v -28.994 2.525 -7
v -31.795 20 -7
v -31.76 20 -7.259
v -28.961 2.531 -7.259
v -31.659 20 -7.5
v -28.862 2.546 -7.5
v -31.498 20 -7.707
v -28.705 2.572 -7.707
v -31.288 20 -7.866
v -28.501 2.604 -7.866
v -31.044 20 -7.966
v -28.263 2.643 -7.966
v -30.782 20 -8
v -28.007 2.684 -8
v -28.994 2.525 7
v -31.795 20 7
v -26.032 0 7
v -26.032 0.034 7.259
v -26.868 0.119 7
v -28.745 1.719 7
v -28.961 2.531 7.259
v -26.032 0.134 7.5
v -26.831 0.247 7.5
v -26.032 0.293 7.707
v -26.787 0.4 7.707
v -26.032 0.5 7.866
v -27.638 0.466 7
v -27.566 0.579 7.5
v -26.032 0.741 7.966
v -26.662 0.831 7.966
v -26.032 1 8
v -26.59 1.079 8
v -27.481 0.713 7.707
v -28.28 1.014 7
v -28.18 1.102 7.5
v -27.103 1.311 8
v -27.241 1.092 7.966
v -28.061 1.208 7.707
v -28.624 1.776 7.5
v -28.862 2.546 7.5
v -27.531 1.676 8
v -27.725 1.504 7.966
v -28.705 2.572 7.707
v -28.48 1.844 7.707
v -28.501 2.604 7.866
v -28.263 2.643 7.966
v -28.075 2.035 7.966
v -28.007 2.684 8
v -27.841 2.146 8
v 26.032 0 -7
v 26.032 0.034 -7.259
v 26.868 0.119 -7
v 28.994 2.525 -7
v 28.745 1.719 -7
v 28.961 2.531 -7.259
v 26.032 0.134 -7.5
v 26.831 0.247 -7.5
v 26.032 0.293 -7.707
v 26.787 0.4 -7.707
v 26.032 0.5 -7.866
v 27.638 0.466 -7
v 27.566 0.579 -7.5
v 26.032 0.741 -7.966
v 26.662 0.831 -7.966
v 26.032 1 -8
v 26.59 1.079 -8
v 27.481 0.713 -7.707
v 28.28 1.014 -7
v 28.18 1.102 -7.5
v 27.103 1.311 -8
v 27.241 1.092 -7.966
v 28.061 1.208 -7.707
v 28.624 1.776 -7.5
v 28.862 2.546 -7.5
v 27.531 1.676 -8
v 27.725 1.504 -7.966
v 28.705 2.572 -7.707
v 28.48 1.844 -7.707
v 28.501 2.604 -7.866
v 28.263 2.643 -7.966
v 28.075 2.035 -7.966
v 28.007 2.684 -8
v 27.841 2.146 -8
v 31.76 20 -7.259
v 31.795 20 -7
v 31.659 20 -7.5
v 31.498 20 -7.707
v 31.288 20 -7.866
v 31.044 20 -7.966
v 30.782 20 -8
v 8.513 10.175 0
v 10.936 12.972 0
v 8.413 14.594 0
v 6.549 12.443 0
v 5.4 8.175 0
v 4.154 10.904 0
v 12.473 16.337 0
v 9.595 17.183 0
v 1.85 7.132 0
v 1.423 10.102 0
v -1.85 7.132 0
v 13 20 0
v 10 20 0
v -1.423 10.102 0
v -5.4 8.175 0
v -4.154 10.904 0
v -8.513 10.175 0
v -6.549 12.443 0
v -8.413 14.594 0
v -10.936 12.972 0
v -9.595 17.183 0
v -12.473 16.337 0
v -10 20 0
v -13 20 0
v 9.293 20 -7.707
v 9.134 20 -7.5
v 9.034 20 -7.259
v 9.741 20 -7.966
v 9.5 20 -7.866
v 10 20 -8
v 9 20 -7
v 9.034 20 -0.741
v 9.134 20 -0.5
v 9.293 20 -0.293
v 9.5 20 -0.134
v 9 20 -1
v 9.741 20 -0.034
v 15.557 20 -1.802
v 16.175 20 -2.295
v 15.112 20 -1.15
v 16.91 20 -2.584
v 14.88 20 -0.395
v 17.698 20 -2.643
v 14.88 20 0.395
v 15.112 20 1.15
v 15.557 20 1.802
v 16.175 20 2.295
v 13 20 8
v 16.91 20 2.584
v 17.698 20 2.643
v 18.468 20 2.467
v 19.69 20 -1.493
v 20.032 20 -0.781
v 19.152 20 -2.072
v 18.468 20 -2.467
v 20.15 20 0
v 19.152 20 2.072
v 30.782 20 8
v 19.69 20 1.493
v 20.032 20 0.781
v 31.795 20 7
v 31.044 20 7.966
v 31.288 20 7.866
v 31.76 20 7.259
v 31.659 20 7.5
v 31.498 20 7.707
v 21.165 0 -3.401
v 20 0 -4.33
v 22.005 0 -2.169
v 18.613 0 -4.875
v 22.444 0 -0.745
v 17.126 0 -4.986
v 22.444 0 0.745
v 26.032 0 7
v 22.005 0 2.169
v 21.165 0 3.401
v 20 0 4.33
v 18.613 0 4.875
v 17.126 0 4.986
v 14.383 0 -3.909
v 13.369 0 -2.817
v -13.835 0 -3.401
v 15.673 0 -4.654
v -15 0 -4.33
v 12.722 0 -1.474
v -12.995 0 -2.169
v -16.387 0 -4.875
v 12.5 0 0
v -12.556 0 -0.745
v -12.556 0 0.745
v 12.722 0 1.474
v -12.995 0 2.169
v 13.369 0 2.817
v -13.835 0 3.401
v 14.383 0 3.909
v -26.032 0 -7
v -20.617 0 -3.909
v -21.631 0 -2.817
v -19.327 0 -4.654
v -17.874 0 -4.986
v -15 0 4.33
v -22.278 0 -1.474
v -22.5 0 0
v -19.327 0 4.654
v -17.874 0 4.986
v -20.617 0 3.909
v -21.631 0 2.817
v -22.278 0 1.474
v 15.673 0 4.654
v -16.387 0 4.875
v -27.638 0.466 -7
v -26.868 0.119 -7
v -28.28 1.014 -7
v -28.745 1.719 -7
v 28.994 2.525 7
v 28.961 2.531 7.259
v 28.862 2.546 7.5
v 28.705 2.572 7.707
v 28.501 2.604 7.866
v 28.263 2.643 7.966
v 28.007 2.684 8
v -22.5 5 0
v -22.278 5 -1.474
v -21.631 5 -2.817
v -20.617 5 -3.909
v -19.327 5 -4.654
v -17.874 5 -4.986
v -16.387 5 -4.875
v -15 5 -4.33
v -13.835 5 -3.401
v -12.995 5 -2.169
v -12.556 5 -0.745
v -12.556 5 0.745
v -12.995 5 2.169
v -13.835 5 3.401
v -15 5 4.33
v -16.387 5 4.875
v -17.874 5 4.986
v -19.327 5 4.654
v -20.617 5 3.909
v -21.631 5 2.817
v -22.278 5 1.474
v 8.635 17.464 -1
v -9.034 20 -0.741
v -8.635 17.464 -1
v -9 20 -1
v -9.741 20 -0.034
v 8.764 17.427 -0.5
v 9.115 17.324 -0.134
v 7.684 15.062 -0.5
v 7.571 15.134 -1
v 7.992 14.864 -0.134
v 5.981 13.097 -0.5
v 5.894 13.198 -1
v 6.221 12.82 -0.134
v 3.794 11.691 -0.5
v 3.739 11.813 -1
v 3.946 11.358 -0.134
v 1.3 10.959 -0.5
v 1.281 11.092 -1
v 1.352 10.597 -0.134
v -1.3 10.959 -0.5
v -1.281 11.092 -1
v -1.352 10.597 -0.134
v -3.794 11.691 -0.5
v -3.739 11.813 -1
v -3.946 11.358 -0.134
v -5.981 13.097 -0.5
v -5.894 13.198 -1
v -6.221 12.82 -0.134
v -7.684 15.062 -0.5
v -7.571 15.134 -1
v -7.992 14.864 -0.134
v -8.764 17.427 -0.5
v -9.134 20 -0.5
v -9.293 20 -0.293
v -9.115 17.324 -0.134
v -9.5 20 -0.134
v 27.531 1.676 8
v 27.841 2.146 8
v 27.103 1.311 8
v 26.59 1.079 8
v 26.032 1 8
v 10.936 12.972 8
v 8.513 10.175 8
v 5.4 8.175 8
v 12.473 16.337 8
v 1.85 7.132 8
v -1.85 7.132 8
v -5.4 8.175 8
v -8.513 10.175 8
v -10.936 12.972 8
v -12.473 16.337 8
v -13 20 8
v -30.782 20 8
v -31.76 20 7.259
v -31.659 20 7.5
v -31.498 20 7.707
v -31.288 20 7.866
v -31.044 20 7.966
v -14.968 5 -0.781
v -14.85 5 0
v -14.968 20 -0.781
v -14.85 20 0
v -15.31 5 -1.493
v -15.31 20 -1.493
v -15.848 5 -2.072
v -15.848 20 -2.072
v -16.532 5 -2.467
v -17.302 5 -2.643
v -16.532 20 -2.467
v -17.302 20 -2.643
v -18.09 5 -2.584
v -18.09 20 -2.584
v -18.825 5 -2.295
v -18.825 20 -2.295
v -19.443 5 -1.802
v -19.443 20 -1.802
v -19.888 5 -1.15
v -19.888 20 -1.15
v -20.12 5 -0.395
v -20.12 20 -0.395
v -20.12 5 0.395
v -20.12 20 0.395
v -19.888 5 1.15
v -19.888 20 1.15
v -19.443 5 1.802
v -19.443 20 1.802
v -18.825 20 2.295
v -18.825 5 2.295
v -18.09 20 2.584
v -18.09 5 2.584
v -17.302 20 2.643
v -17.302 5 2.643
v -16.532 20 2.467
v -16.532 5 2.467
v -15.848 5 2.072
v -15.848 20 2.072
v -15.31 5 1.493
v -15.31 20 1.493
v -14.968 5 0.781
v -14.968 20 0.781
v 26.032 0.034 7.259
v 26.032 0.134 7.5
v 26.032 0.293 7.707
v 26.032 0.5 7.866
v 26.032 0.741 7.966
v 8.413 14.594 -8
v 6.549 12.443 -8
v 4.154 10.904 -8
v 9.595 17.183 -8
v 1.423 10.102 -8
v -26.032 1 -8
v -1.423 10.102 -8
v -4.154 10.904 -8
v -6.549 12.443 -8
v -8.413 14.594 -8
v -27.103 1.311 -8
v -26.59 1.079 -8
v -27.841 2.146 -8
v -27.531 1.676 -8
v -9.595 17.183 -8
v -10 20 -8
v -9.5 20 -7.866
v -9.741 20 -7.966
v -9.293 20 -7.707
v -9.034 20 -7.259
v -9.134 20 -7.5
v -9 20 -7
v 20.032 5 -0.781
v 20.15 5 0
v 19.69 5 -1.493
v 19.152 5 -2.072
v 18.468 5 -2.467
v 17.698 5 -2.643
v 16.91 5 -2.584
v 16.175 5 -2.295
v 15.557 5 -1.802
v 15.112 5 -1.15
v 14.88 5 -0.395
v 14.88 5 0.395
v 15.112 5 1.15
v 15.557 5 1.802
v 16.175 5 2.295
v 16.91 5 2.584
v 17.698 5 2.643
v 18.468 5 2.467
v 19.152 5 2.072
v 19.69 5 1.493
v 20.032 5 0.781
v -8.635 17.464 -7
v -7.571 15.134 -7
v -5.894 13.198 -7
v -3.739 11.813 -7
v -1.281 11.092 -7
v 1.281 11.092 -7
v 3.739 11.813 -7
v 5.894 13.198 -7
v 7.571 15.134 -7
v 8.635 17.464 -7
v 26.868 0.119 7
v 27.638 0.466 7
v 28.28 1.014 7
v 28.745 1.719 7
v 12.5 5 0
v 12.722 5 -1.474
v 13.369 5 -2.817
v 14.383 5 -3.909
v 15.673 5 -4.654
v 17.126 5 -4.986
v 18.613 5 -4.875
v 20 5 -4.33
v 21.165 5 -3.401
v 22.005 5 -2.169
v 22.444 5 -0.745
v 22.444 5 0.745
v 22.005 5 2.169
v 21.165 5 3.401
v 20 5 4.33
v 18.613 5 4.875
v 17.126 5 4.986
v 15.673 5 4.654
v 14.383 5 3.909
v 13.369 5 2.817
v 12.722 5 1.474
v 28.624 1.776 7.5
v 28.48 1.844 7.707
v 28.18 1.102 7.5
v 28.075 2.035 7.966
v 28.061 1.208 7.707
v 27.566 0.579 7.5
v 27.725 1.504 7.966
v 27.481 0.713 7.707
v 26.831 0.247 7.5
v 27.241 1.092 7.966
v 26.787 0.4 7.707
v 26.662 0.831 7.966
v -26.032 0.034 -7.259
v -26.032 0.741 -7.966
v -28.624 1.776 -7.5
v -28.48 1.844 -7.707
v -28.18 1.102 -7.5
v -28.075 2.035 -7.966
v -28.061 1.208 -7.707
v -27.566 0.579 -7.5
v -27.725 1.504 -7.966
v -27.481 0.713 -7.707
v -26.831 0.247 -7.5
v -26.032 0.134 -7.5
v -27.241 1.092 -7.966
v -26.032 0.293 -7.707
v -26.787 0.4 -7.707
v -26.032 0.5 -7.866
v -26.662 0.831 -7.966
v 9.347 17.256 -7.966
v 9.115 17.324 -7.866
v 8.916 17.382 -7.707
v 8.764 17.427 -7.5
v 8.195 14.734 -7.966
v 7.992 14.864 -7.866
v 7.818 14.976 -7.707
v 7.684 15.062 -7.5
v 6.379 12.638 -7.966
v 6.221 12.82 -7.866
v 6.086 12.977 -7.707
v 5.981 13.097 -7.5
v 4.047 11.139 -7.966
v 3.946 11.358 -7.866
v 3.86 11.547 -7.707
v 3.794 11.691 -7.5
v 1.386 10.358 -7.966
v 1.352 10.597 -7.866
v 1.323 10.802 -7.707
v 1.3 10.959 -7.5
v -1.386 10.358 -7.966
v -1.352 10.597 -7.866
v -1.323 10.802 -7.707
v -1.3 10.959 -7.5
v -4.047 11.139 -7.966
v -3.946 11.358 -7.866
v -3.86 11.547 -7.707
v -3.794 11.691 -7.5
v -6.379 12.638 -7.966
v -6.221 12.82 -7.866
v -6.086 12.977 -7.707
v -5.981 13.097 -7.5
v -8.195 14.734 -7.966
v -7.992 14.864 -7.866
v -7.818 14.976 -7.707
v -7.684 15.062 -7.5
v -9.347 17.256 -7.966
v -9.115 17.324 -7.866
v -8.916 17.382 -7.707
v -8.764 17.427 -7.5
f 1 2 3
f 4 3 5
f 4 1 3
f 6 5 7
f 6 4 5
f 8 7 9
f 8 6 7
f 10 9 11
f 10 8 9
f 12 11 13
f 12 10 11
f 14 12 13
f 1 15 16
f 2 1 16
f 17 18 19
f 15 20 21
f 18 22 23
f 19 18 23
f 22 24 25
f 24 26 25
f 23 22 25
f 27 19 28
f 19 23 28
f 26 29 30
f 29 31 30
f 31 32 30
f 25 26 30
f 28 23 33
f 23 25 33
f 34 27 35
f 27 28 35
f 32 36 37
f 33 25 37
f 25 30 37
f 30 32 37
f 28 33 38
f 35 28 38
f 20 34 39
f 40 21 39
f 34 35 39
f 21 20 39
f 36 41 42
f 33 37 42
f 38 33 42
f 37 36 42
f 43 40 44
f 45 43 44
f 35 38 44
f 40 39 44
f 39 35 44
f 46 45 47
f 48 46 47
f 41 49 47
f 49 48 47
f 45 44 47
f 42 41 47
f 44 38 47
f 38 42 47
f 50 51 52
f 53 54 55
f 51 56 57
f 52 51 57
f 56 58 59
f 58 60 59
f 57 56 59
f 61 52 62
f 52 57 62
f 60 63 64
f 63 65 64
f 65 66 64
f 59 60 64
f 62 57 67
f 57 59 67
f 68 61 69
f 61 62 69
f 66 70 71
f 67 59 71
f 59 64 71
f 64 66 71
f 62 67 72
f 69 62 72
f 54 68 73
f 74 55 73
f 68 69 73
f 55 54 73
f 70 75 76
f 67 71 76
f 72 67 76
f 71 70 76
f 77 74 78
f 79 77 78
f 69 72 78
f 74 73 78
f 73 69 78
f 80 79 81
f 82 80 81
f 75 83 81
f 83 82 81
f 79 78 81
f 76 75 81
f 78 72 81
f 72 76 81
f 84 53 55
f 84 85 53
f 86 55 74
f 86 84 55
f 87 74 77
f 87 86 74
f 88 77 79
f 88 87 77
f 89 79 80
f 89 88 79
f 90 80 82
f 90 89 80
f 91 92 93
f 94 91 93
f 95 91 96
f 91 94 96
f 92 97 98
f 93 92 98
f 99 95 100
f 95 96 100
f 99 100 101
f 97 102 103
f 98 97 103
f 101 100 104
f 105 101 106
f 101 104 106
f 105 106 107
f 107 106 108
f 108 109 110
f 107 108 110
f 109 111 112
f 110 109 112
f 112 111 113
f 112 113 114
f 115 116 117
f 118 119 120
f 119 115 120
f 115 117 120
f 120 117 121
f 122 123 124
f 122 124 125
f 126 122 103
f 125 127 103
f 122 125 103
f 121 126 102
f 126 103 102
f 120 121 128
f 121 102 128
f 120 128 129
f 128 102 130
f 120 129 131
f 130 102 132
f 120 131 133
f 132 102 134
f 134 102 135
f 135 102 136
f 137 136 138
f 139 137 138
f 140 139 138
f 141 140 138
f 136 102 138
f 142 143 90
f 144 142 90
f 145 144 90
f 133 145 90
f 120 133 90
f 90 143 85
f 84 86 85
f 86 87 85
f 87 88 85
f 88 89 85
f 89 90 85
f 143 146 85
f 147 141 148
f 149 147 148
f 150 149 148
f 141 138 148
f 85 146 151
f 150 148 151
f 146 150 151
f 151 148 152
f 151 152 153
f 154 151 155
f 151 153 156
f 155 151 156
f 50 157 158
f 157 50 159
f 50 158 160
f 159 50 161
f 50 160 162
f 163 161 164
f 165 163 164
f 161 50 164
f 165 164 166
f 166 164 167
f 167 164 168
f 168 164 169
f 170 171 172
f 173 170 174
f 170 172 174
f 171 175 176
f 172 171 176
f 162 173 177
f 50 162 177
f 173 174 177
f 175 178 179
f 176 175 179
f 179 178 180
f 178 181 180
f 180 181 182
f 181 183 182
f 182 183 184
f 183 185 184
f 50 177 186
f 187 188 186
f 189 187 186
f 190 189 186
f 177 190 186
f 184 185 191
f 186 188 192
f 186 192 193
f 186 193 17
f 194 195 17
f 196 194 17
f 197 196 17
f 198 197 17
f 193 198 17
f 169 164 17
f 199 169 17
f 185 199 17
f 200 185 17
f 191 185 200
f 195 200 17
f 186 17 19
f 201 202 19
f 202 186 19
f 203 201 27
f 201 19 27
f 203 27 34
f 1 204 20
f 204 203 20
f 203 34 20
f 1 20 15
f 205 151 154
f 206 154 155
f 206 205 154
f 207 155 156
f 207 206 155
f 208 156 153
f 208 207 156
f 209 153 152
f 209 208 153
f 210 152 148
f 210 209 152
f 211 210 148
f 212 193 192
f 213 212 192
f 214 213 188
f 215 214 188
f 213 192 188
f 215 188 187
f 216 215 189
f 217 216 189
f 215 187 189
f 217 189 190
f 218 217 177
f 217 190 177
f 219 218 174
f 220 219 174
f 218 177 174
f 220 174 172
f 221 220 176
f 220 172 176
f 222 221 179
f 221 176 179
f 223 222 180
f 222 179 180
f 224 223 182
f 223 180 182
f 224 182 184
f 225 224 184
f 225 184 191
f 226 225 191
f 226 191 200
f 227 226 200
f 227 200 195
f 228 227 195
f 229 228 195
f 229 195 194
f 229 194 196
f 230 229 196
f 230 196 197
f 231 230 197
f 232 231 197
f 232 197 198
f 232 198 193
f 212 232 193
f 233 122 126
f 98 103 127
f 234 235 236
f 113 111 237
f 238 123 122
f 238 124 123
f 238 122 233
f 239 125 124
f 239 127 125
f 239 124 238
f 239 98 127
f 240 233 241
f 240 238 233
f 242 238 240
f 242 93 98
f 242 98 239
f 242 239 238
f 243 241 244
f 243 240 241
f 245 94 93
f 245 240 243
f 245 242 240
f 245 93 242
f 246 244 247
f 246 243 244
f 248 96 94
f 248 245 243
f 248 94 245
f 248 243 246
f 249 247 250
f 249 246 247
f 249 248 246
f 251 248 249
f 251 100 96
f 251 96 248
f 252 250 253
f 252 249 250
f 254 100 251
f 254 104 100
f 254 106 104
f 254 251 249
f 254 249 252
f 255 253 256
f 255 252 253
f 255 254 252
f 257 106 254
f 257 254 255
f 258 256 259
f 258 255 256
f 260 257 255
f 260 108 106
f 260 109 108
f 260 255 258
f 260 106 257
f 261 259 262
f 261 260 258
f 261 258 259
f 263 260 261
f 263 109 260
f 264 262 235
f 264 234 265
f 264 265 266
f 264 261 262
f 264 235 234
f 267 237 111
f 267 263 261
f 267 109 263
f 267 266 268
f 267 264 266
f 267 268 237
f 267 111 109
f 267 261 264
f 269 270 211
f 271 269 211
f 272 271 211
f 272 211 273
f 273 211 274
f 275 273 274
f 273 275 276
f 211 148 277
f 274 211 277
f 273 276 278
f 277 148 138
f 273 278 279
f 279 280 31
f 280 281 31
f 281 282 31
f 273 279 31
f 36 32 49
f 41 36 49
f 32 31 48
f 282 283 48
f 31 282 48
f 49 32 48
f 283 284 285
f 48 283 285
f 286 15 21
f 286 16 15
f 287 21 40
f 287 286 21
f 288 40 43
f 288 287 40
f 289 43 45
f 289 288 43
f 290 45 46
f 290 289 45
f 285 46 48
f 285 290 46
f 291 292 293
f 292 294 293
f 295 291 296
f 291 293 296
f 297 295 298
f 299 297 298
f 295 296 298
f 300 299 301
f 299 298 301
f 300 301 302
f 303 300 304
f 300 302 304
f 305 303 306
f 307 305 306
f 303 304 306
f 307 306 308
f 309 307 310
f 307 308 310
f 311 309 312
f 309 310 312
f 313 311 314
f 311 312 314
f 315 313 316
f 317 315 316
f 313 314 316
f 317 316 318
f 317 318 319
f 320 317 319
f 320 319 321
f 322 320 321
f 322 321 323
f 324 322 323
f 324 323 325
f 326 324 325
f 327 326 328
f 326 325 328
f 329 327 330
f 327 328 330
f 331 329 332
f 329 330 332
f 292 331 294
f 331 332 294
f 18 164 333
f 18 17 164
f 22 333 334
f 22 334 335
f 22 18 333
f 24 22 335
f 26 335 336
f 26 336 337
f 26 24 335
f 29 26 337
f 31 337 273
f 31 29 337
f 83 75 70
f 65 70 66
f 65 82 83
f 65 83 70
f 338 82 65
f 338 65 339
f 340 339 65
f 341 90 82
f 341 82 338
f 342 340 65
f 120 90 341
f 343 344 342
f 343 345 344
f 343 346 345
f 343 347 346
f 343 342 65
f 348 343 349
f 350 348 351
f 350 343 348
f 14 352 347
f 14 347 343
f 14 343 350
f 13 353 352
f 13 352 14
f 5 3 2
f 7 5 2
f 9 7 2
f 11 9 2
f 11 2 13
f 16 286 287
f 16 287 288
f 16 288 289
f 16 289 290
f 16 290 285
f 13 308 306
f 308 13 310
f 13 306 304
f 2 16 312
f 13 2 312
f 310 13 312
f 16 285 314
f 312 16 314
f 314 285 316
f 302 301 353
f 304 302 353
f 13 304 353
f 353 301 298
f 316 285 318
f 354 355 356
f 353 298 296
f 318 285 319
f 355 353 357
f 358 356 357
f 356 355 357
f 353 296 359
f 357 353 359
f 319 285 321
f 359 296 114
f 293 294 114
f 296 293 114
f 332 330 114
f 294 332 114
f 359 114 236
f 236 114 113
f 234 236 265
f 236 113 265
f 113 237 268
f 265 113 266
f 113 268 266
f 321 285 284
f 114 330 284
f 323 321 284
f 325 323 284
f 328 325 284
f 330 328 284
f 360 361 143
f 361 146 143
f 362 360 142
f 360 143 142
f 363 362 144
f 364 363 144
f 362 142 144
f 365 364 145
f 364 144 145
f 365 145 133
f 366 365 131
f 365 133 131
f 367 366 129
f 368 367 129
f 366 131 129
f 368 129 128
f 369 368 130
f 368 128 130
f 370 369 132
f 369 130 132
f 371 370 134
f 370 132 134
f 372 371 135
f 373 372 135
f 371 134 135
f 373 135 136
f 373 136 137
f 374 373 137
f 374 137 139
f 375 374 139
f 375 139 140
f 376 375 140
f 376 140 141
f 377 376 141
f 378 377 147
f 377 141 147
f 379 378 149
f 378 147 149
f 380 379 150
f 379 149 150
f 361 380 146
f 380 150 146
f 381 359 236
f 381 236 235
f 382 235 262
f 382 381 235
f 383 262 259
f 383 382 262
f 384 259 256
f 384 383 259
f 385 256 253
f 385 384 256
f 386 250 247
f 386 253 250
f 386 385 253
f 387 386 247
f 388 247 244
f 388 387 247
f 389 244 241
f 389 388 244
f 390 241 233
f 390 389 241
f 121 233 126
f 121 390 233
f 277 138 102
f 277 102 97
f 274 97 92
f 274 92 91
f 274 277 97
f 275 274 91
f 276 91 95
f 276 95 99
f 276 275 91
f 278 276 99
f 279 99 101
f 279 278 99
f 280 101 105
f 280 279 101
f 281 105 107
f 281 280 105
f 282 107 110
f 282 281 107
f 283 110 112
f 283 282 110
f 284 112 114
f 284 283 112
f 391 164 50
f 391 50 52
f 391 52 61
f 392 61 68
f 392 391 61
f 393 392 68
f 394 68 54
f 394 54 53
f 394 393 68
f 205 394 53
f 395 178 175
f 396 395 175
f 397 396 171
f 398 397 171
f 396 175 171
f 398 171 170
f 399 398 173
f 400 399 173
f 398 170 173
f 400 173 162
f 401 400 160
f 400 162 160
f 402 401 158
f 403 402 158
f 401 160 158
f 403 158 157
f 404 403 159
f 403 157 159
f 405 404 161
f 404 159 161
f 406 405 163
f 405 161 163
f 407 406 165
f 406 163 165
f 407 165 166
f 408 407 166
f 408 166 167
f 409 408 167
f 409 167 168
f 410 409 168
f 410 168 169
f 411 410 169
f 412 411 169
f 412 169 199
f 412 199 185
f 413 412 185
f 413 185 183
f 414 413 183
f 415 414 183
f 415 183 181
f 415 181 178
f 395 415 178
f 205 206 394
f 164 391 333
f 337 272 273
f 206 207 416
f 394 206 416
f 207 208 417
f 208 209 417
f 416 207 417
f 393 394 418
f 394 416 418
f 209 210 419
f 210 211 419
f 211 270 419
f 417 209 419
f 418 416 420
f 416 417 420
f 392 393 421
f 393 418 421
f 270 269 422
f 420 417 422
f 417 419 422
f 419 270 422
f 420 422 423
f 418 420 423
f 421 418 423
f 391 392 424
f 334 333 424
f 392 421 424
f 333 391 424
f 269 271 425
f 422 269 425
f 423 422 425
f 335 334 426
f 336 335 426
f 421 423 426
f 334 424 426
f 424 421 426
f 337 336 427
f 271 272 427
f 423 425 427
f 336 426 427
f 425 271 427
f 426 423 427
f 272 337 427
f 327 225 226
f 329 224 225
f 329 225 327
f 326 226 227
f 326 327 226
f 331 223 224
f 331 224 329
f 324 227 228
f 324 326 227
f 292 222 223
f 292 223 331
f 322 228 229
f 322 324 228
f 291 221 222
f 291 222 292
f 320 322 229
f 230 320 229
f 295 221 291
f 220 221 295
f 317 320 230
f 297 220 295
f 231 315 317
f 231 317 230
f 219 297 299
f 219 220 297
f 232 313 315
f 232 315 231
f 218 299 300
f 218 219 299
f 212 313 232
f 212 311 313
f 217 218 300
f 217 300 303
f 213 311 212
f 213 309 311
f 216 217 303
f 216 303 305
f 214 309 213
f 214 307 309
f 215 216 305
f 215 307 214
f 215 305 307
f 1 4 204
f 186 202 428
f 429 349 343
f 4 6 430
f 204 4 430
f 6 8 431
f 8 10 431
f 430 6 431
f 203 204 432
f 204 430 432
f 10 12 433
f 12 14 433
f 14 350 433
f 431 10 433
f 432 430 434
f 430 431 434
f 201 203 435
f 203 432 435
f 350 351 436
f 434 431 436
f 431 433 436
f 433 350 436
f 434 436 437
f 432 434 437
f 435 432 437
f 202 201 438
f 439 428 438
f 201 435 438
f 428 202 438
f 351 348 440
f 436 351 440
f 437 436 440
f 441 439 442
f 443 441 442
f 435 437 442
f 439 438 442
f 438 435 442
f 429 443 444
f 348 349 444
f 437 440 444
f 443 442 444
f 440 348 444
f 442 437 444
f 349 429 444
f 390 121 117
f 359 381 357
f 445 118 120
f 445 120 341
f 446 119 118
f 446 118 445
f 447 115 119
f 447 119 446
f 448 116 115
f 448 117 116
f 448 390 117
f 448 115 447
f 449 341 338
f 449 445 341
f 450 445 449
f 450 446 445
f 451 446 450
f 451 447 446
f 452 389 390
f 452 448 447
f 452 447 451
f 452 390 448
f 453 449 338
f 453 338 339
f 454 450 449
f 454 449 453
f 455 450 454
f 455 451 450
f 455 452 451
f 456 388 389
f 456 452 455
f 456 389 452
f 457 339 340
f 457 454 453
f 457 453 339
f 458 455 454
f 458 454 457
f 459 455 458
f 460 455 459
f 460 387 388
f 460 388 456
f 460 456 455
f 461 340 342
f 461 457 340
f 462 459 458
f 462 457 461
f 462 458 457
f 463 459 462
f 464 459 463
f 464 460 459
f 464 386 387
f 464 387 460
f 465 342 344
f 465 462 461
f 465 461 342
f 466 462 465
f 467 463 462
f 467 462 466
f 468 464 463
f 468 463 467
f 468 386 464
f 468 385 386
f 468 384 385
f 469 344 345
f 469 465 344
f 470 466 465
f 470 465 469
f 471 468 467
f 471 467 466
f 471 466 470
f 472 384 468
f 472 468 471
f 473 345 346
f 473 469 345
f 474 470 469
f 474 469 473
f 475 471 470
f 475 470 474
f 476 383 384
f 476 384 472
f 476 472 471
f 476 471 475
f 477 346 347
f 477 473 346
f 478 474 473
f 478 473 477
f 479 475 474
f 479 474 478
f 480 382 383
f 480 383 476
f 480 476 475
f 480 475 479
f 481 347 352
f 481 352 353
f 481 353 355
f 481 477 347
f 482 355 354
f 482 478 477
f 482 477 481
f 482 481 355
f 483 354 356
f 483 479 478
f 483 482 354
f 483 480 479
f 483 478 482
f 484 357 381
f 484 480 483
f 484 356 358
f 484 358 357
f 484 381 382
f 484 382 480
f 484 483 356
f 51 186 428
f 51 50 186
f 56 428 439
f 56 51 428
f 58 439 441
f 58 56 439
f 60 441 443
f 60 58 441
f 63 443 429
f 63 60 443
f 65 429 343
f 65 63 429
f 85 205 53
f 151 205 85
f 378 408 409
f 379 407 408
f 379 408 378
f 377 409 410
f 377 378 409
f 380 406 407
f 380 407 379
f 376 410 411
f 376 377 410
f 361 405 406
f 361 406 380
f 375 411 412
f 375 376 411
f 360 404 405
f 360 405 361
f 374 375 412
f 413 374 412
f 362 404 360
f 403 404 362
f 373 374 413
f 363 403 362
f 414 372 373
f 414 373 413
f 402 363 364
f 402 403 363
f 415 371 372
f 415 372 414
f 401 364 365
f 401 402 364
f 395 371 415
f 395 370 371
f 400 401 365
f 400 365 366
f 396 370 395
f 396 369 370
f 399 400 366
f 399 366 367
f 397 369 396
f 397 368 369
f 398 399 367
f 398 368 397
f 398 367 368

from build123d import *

# Parameters (mm, degrees)
DODANIE_WYCI_GNI_CIE1_DEPTH                       = 8
WYTNIJ_WYCI_GNI_CIE1_DEPTH                        = 8
WYTNIJ_WYCI_GNI_CIE2_DEPTH                        = 39.404607438
WYTNIJ_WYCI_GNI_CIE2_DEPTH_BACK                   = 39.404607438
POG_BIENIE_WALCOWE_POD_M5_RUB_Z_BEM_W_D           = 5.3
POG_BIENIE_WALCOWE_POD_M5_RUB_Z_BEM_W_CBORE_D     = 10
POG_BIENIE_WALCOWE_POD_M5_RUB_Z_BEM_W_CBORE_DEPTH = 5
ZAOKR_GLENIE1_R                                   = 3
ZAOKR_GLENIE2_R                                   = 1


with BuildPart() as part:
    # Szkic1 → Dodanie-wyciągnięcie1 (new, symmetric)
    with BuildSketch(Plane.XY):
        Polygon((0, 0), (28.58974359, 0), (31.794871795, 20), (0, 20), align=None)
    dodanie_wyci_gni_cie1 = extrude(amount=DODANIE_WYCI_GNI_CIE1_DEPTH, both=True)

    # Lustro1: Dodanie-wyciągnięcie1 across plane
    add(dodanie_wyci_gni_cie1.mirror(Plane(origin=(0, 20, 8), x_dir=(0, 0, 1), z_dir=(1, 0, 0))))

    # Szkic2 → Wytnij-wyciągnięcie1 (cut)
    with BuildSketch(Plane.XY.offset(8)):
        with BuildLine():
            Line((-13, 20), (13, 20))
            ThreePointArc((13, 20), (0, 7), (-13, 20))
        make_face()
    extrude(amount=-WYTNIJ_WYCI_GNI_CIE1_DEPTH, mode=Mode.SUBTRACT)

    # Szkic3 → Wytnij-wyciągnięcie2 (cut, two sides: drawn at the far end of the back side and taken through both)
    with BuildSketch(Plane.XY.offset(-WYTNIJ_WYCI_GNI_CIE2_DEPTH_BACK)):
        with BuildLine():
            ThreePointArc((-9, 20), (0, 11), (9, 20))
            Line((9, 20), (-9, 20))
        make_face()
    extrude(amount=WYTNIJ_WYCI_GNI_CIE2_DEPTH + WYTNIJ_WYCI_GNI_CIE2_DEPTH_BACK, mode=Mode.SUBTRACT)

    # Pogłębienie walcowe pod M5 Śrubę z łbem walcowym z gniazdem1 (through all)
    with Locations(Plane(origin=(0, 0, 0), x_dir=(-1, 0, 0), z_dir=(0, -1, 0))):
        with Locations((-17.5, 0), (17.5, 0)):
            CounterBoreHole(POG_BIENIE_WALCOWE_POD_M5_RUB_Z_BEM_W_D / 2, POG_BIENIE_WALCOWE_POD_M5_RUB_Z_BEM_W_CBORE_D / 2, POG_BIENIE_WALCOWE_POD_M5_RUB_Z_BEM_W_CBORE_DEPTH)

    # Zaokrąglenie1
    zaokr_glenie1_edges = [part.edges().sort_by_distance(p)[0] for p in [
        (-28.58974359, 0, 0),
        (28.58974359, 0, 0),
    ]]
    fillet(zaokr_glenie1_edges, radius=ZAOKR_GLENIE1_R)

    # Zaokrąglenie2
    zaokr_glenie2_edges = [part.edges().sort_by_distance(p)[0] for p in [
        (0, 11, 0),
        (0, 11, -8),
        (0, 0, -8),
        (0, 0, 8),
        (30.394654482, 11.262643966, -8),
        (-30.394654482, 11.262643966, -8),
        (27.978494862, 0.717004577, -8),
        (-27.978494862, 0.717004577, -8),
        (-30.394654482, 11.262643966, 8),
        (30.394654482, 11.262643966, 8),
        (27.978494862, 0.717004577, 8),
        (-27.978494862, 0.717004577, 8),
    ]]
    fillet(zaokr_glenie2_edges, radius=ZAOKR_GLENIE2_R)


solid = part.part
